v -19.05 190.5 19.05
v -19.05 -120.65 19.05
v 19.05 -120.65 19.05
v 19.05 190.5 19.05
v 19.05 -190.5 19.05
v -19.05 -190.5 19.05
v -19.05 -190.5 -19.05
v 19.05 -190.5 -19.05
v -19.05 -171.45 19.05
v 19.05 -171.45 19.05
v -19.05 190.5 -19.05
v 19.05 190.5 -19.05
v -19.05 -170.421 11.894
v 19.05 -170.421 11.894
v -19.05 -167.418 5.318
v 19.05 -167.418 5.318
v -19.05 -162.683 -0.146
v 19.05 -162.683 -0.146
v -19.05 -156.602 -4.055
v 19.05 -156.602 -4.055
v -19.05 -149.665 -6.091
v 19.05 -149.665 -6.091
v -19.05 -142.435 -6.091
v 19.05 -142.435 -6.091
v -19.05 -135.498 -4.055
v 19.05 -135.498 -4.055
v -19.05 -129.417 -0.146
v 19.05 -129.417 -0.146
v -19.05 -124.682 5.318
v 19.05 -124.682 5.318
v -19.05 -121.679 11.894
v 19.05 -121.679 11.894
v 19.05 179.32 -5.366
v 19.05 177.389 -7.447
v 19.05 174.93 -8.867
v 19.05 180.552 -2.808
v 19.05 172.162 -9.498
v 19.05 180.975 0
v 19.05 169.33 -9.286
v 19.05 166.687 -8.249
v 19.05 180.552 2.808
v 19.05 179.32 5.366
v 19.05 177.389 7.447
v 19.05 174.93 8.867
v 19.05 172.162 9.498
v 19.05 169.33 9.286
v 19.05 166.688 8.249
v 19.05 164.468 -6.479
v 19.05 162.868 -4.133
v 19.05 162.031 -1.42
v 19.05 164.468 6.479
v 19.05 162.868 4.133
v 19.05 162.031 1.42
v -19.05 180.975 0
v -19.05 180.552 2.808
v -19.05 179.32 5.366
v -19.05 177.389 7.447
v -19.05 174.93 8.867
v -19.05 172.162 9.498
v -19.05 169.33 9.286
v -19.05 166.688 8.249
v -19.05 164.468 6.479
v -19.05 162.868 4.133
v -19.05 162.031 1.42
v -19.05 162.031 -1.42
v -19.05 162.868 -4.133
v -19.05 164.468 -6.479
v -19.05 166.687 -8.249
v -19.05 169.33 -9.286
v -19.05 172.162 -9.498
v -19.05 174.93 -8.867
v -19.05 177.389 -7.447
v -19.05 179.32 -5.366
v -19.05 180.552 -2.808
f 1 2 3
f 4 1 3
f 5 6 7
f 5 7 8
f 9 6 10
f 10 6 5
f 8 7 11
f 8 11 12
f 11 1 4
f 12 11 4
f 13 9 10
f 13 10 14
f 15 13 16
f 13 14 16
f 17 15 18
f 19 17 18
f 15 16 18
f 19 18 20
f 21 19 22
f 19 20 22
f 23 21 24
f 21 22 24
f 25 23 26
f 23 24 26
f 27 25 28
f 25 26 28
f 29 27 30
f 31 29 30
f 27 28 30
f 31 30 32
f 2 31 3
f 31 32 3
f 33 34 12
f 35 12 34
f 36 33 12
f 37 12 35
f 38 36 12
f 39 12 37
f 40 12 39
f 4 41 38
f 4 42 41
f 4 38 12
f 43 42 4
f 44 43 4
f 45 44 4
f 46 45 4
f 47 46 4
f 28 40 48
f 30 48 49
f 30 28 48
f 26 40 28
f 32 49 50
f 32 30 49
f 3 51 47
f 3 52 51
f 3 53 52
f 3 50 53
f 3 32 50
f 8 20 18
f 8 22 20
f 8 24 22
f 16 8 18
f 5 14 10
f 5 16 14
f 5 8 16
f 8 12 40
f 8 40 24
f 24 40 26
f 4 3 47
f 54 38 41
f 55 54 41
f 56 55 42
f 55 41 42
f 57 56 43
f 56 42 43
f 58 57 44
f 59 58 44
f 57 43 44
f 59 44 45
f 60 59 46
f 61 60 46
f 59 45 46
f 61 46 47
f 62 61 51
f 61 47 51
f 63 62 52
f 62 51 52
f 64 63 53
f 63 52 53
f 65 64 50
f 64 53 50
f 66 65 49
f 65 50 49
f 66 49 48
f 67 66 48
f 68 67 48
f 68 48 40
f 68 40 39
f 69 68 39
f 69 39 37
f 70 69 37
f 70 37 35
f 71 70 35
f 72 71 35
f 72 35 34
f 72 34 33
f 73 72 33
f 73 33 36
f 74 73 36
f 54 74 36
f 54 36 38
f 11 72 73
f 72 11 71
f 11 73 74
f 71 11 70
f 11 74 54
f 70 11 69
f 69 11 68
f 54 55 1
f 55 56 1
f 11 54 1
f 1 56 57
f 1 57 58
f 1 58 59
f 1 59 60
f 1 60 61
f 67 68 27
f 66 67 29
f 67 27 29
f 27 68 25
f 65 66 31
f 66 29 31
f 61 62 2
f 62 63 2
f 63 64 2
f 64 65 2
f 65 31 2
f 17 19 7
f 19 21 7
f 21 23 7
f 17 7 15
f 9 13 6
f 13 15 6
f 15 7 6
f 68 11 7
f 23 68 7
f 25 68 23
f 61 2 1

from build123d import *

# Parameters (mm, degrees)
F0_W     = 38.100004
F0_H     = 38.1
F1_DEPTH = 190.5
F2_R     = 25.4
F3_DEPTH = 38.101003
F4_R     = 9.525
F5_DEPTH = 38.101003


with BuildPart() as f1:
    # F0 (on Front) → F1 (new body, symmetric)
    with BuildSketch(Plane.XZ):
        Rectangle(F0_W, F0_H)
    extrude(amount=F1_DEPTH, both=True)

    # F2 (on face) → F3 (cut, through all)
    with BuildSketch(Plane.YZ.offset(19.050002)):
        with Locations((-146.05, 19.05)):
            Circle(F2_R)
    extrude(amount=-F3_DEPTH, mode=Mode.SUBTRACT)

    # F4 (on face) → F5 (cut, through all)
    with BuildSketch(Plane.YZ.offset(19.050002)):
        with Locations((171.45, 0)):
            Circle(F4_R)
    extrude(amount=-F5_DEPTH, mode=Mode.SUBTRACT)


solid = f1.part
